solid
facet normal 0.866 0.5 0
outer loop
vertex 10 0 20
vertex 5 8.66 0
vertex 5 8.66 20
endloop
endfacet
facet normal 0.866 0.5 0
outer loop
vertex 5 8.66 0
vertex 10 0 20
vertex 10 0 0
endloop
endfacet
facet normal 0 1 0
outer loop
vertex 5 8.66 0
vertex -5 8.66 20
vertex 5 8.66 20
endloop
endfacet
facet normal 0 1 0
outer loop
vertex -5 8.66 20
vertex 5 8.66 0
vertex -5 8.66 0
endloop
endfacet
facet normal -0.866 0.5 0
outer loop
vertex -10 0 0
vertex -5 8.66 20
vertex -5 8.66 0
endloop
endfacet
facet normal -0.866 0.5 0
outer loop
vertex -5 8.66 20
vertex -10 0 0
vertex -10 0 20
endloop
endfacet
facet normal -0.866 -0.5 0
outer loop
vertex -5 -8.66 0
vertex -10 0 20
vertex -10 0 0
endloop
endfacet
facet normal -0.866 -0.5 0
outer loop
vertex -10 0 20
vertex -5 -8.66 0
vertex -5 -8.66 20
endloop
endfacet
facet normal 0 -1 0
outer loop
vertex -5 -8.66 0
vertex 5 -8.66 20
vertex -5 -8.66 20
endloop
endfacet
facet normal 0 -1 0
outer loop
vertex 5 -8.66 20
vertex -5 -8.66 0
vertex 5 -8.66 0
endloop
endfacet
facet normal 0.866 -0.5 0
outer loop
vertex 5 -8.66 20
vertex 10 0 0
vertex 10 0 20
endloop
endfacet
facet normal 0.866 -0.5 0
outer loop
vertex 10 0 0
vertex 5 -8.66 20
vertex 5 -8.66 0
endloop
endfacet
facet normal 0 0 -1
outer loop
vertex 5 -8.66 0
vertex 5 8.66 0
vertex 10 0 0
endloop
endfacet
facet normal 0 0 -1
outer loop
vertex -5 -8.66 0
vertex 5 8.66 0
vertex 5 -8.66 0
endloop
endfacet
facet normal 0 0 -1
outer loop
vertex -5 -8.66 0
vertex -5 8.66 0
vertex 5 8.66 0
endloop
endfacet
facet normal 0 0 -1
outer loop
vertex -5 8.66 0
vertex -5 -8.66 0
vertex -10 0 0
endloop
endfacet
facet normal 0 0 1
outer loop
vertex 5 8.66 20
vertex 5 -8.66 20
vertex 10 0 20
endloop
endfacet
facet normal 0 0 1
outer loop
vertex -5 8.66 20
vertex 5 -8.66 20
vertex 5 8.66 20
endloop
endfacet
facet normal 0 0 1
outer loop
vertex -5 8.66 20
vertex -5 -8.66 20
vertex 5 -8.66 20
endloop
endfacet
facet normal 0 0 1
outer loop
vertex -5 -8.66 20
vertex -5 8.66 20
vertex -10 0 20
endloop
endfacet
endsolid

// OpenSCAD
/* [Basic Parameters] */
// Radius of the cylinder
radius = 10; // [5:50]
// Height of the cylinder
height = 20; // [10:100]
// Number of sides
sides = 6; // [3:12]

/* [Advanced] */
// Enable rotation
rotate_model = false;
// Rotation angle
angle = 45; // [0:360]

// Create the model
if (rotate_model) {
    rotate([0, 0, angle])
        cylinder(r=radius, h=height, $fn=sides);
} else {
    cylinder(r=radius, h=height, $fn=sides);
}
